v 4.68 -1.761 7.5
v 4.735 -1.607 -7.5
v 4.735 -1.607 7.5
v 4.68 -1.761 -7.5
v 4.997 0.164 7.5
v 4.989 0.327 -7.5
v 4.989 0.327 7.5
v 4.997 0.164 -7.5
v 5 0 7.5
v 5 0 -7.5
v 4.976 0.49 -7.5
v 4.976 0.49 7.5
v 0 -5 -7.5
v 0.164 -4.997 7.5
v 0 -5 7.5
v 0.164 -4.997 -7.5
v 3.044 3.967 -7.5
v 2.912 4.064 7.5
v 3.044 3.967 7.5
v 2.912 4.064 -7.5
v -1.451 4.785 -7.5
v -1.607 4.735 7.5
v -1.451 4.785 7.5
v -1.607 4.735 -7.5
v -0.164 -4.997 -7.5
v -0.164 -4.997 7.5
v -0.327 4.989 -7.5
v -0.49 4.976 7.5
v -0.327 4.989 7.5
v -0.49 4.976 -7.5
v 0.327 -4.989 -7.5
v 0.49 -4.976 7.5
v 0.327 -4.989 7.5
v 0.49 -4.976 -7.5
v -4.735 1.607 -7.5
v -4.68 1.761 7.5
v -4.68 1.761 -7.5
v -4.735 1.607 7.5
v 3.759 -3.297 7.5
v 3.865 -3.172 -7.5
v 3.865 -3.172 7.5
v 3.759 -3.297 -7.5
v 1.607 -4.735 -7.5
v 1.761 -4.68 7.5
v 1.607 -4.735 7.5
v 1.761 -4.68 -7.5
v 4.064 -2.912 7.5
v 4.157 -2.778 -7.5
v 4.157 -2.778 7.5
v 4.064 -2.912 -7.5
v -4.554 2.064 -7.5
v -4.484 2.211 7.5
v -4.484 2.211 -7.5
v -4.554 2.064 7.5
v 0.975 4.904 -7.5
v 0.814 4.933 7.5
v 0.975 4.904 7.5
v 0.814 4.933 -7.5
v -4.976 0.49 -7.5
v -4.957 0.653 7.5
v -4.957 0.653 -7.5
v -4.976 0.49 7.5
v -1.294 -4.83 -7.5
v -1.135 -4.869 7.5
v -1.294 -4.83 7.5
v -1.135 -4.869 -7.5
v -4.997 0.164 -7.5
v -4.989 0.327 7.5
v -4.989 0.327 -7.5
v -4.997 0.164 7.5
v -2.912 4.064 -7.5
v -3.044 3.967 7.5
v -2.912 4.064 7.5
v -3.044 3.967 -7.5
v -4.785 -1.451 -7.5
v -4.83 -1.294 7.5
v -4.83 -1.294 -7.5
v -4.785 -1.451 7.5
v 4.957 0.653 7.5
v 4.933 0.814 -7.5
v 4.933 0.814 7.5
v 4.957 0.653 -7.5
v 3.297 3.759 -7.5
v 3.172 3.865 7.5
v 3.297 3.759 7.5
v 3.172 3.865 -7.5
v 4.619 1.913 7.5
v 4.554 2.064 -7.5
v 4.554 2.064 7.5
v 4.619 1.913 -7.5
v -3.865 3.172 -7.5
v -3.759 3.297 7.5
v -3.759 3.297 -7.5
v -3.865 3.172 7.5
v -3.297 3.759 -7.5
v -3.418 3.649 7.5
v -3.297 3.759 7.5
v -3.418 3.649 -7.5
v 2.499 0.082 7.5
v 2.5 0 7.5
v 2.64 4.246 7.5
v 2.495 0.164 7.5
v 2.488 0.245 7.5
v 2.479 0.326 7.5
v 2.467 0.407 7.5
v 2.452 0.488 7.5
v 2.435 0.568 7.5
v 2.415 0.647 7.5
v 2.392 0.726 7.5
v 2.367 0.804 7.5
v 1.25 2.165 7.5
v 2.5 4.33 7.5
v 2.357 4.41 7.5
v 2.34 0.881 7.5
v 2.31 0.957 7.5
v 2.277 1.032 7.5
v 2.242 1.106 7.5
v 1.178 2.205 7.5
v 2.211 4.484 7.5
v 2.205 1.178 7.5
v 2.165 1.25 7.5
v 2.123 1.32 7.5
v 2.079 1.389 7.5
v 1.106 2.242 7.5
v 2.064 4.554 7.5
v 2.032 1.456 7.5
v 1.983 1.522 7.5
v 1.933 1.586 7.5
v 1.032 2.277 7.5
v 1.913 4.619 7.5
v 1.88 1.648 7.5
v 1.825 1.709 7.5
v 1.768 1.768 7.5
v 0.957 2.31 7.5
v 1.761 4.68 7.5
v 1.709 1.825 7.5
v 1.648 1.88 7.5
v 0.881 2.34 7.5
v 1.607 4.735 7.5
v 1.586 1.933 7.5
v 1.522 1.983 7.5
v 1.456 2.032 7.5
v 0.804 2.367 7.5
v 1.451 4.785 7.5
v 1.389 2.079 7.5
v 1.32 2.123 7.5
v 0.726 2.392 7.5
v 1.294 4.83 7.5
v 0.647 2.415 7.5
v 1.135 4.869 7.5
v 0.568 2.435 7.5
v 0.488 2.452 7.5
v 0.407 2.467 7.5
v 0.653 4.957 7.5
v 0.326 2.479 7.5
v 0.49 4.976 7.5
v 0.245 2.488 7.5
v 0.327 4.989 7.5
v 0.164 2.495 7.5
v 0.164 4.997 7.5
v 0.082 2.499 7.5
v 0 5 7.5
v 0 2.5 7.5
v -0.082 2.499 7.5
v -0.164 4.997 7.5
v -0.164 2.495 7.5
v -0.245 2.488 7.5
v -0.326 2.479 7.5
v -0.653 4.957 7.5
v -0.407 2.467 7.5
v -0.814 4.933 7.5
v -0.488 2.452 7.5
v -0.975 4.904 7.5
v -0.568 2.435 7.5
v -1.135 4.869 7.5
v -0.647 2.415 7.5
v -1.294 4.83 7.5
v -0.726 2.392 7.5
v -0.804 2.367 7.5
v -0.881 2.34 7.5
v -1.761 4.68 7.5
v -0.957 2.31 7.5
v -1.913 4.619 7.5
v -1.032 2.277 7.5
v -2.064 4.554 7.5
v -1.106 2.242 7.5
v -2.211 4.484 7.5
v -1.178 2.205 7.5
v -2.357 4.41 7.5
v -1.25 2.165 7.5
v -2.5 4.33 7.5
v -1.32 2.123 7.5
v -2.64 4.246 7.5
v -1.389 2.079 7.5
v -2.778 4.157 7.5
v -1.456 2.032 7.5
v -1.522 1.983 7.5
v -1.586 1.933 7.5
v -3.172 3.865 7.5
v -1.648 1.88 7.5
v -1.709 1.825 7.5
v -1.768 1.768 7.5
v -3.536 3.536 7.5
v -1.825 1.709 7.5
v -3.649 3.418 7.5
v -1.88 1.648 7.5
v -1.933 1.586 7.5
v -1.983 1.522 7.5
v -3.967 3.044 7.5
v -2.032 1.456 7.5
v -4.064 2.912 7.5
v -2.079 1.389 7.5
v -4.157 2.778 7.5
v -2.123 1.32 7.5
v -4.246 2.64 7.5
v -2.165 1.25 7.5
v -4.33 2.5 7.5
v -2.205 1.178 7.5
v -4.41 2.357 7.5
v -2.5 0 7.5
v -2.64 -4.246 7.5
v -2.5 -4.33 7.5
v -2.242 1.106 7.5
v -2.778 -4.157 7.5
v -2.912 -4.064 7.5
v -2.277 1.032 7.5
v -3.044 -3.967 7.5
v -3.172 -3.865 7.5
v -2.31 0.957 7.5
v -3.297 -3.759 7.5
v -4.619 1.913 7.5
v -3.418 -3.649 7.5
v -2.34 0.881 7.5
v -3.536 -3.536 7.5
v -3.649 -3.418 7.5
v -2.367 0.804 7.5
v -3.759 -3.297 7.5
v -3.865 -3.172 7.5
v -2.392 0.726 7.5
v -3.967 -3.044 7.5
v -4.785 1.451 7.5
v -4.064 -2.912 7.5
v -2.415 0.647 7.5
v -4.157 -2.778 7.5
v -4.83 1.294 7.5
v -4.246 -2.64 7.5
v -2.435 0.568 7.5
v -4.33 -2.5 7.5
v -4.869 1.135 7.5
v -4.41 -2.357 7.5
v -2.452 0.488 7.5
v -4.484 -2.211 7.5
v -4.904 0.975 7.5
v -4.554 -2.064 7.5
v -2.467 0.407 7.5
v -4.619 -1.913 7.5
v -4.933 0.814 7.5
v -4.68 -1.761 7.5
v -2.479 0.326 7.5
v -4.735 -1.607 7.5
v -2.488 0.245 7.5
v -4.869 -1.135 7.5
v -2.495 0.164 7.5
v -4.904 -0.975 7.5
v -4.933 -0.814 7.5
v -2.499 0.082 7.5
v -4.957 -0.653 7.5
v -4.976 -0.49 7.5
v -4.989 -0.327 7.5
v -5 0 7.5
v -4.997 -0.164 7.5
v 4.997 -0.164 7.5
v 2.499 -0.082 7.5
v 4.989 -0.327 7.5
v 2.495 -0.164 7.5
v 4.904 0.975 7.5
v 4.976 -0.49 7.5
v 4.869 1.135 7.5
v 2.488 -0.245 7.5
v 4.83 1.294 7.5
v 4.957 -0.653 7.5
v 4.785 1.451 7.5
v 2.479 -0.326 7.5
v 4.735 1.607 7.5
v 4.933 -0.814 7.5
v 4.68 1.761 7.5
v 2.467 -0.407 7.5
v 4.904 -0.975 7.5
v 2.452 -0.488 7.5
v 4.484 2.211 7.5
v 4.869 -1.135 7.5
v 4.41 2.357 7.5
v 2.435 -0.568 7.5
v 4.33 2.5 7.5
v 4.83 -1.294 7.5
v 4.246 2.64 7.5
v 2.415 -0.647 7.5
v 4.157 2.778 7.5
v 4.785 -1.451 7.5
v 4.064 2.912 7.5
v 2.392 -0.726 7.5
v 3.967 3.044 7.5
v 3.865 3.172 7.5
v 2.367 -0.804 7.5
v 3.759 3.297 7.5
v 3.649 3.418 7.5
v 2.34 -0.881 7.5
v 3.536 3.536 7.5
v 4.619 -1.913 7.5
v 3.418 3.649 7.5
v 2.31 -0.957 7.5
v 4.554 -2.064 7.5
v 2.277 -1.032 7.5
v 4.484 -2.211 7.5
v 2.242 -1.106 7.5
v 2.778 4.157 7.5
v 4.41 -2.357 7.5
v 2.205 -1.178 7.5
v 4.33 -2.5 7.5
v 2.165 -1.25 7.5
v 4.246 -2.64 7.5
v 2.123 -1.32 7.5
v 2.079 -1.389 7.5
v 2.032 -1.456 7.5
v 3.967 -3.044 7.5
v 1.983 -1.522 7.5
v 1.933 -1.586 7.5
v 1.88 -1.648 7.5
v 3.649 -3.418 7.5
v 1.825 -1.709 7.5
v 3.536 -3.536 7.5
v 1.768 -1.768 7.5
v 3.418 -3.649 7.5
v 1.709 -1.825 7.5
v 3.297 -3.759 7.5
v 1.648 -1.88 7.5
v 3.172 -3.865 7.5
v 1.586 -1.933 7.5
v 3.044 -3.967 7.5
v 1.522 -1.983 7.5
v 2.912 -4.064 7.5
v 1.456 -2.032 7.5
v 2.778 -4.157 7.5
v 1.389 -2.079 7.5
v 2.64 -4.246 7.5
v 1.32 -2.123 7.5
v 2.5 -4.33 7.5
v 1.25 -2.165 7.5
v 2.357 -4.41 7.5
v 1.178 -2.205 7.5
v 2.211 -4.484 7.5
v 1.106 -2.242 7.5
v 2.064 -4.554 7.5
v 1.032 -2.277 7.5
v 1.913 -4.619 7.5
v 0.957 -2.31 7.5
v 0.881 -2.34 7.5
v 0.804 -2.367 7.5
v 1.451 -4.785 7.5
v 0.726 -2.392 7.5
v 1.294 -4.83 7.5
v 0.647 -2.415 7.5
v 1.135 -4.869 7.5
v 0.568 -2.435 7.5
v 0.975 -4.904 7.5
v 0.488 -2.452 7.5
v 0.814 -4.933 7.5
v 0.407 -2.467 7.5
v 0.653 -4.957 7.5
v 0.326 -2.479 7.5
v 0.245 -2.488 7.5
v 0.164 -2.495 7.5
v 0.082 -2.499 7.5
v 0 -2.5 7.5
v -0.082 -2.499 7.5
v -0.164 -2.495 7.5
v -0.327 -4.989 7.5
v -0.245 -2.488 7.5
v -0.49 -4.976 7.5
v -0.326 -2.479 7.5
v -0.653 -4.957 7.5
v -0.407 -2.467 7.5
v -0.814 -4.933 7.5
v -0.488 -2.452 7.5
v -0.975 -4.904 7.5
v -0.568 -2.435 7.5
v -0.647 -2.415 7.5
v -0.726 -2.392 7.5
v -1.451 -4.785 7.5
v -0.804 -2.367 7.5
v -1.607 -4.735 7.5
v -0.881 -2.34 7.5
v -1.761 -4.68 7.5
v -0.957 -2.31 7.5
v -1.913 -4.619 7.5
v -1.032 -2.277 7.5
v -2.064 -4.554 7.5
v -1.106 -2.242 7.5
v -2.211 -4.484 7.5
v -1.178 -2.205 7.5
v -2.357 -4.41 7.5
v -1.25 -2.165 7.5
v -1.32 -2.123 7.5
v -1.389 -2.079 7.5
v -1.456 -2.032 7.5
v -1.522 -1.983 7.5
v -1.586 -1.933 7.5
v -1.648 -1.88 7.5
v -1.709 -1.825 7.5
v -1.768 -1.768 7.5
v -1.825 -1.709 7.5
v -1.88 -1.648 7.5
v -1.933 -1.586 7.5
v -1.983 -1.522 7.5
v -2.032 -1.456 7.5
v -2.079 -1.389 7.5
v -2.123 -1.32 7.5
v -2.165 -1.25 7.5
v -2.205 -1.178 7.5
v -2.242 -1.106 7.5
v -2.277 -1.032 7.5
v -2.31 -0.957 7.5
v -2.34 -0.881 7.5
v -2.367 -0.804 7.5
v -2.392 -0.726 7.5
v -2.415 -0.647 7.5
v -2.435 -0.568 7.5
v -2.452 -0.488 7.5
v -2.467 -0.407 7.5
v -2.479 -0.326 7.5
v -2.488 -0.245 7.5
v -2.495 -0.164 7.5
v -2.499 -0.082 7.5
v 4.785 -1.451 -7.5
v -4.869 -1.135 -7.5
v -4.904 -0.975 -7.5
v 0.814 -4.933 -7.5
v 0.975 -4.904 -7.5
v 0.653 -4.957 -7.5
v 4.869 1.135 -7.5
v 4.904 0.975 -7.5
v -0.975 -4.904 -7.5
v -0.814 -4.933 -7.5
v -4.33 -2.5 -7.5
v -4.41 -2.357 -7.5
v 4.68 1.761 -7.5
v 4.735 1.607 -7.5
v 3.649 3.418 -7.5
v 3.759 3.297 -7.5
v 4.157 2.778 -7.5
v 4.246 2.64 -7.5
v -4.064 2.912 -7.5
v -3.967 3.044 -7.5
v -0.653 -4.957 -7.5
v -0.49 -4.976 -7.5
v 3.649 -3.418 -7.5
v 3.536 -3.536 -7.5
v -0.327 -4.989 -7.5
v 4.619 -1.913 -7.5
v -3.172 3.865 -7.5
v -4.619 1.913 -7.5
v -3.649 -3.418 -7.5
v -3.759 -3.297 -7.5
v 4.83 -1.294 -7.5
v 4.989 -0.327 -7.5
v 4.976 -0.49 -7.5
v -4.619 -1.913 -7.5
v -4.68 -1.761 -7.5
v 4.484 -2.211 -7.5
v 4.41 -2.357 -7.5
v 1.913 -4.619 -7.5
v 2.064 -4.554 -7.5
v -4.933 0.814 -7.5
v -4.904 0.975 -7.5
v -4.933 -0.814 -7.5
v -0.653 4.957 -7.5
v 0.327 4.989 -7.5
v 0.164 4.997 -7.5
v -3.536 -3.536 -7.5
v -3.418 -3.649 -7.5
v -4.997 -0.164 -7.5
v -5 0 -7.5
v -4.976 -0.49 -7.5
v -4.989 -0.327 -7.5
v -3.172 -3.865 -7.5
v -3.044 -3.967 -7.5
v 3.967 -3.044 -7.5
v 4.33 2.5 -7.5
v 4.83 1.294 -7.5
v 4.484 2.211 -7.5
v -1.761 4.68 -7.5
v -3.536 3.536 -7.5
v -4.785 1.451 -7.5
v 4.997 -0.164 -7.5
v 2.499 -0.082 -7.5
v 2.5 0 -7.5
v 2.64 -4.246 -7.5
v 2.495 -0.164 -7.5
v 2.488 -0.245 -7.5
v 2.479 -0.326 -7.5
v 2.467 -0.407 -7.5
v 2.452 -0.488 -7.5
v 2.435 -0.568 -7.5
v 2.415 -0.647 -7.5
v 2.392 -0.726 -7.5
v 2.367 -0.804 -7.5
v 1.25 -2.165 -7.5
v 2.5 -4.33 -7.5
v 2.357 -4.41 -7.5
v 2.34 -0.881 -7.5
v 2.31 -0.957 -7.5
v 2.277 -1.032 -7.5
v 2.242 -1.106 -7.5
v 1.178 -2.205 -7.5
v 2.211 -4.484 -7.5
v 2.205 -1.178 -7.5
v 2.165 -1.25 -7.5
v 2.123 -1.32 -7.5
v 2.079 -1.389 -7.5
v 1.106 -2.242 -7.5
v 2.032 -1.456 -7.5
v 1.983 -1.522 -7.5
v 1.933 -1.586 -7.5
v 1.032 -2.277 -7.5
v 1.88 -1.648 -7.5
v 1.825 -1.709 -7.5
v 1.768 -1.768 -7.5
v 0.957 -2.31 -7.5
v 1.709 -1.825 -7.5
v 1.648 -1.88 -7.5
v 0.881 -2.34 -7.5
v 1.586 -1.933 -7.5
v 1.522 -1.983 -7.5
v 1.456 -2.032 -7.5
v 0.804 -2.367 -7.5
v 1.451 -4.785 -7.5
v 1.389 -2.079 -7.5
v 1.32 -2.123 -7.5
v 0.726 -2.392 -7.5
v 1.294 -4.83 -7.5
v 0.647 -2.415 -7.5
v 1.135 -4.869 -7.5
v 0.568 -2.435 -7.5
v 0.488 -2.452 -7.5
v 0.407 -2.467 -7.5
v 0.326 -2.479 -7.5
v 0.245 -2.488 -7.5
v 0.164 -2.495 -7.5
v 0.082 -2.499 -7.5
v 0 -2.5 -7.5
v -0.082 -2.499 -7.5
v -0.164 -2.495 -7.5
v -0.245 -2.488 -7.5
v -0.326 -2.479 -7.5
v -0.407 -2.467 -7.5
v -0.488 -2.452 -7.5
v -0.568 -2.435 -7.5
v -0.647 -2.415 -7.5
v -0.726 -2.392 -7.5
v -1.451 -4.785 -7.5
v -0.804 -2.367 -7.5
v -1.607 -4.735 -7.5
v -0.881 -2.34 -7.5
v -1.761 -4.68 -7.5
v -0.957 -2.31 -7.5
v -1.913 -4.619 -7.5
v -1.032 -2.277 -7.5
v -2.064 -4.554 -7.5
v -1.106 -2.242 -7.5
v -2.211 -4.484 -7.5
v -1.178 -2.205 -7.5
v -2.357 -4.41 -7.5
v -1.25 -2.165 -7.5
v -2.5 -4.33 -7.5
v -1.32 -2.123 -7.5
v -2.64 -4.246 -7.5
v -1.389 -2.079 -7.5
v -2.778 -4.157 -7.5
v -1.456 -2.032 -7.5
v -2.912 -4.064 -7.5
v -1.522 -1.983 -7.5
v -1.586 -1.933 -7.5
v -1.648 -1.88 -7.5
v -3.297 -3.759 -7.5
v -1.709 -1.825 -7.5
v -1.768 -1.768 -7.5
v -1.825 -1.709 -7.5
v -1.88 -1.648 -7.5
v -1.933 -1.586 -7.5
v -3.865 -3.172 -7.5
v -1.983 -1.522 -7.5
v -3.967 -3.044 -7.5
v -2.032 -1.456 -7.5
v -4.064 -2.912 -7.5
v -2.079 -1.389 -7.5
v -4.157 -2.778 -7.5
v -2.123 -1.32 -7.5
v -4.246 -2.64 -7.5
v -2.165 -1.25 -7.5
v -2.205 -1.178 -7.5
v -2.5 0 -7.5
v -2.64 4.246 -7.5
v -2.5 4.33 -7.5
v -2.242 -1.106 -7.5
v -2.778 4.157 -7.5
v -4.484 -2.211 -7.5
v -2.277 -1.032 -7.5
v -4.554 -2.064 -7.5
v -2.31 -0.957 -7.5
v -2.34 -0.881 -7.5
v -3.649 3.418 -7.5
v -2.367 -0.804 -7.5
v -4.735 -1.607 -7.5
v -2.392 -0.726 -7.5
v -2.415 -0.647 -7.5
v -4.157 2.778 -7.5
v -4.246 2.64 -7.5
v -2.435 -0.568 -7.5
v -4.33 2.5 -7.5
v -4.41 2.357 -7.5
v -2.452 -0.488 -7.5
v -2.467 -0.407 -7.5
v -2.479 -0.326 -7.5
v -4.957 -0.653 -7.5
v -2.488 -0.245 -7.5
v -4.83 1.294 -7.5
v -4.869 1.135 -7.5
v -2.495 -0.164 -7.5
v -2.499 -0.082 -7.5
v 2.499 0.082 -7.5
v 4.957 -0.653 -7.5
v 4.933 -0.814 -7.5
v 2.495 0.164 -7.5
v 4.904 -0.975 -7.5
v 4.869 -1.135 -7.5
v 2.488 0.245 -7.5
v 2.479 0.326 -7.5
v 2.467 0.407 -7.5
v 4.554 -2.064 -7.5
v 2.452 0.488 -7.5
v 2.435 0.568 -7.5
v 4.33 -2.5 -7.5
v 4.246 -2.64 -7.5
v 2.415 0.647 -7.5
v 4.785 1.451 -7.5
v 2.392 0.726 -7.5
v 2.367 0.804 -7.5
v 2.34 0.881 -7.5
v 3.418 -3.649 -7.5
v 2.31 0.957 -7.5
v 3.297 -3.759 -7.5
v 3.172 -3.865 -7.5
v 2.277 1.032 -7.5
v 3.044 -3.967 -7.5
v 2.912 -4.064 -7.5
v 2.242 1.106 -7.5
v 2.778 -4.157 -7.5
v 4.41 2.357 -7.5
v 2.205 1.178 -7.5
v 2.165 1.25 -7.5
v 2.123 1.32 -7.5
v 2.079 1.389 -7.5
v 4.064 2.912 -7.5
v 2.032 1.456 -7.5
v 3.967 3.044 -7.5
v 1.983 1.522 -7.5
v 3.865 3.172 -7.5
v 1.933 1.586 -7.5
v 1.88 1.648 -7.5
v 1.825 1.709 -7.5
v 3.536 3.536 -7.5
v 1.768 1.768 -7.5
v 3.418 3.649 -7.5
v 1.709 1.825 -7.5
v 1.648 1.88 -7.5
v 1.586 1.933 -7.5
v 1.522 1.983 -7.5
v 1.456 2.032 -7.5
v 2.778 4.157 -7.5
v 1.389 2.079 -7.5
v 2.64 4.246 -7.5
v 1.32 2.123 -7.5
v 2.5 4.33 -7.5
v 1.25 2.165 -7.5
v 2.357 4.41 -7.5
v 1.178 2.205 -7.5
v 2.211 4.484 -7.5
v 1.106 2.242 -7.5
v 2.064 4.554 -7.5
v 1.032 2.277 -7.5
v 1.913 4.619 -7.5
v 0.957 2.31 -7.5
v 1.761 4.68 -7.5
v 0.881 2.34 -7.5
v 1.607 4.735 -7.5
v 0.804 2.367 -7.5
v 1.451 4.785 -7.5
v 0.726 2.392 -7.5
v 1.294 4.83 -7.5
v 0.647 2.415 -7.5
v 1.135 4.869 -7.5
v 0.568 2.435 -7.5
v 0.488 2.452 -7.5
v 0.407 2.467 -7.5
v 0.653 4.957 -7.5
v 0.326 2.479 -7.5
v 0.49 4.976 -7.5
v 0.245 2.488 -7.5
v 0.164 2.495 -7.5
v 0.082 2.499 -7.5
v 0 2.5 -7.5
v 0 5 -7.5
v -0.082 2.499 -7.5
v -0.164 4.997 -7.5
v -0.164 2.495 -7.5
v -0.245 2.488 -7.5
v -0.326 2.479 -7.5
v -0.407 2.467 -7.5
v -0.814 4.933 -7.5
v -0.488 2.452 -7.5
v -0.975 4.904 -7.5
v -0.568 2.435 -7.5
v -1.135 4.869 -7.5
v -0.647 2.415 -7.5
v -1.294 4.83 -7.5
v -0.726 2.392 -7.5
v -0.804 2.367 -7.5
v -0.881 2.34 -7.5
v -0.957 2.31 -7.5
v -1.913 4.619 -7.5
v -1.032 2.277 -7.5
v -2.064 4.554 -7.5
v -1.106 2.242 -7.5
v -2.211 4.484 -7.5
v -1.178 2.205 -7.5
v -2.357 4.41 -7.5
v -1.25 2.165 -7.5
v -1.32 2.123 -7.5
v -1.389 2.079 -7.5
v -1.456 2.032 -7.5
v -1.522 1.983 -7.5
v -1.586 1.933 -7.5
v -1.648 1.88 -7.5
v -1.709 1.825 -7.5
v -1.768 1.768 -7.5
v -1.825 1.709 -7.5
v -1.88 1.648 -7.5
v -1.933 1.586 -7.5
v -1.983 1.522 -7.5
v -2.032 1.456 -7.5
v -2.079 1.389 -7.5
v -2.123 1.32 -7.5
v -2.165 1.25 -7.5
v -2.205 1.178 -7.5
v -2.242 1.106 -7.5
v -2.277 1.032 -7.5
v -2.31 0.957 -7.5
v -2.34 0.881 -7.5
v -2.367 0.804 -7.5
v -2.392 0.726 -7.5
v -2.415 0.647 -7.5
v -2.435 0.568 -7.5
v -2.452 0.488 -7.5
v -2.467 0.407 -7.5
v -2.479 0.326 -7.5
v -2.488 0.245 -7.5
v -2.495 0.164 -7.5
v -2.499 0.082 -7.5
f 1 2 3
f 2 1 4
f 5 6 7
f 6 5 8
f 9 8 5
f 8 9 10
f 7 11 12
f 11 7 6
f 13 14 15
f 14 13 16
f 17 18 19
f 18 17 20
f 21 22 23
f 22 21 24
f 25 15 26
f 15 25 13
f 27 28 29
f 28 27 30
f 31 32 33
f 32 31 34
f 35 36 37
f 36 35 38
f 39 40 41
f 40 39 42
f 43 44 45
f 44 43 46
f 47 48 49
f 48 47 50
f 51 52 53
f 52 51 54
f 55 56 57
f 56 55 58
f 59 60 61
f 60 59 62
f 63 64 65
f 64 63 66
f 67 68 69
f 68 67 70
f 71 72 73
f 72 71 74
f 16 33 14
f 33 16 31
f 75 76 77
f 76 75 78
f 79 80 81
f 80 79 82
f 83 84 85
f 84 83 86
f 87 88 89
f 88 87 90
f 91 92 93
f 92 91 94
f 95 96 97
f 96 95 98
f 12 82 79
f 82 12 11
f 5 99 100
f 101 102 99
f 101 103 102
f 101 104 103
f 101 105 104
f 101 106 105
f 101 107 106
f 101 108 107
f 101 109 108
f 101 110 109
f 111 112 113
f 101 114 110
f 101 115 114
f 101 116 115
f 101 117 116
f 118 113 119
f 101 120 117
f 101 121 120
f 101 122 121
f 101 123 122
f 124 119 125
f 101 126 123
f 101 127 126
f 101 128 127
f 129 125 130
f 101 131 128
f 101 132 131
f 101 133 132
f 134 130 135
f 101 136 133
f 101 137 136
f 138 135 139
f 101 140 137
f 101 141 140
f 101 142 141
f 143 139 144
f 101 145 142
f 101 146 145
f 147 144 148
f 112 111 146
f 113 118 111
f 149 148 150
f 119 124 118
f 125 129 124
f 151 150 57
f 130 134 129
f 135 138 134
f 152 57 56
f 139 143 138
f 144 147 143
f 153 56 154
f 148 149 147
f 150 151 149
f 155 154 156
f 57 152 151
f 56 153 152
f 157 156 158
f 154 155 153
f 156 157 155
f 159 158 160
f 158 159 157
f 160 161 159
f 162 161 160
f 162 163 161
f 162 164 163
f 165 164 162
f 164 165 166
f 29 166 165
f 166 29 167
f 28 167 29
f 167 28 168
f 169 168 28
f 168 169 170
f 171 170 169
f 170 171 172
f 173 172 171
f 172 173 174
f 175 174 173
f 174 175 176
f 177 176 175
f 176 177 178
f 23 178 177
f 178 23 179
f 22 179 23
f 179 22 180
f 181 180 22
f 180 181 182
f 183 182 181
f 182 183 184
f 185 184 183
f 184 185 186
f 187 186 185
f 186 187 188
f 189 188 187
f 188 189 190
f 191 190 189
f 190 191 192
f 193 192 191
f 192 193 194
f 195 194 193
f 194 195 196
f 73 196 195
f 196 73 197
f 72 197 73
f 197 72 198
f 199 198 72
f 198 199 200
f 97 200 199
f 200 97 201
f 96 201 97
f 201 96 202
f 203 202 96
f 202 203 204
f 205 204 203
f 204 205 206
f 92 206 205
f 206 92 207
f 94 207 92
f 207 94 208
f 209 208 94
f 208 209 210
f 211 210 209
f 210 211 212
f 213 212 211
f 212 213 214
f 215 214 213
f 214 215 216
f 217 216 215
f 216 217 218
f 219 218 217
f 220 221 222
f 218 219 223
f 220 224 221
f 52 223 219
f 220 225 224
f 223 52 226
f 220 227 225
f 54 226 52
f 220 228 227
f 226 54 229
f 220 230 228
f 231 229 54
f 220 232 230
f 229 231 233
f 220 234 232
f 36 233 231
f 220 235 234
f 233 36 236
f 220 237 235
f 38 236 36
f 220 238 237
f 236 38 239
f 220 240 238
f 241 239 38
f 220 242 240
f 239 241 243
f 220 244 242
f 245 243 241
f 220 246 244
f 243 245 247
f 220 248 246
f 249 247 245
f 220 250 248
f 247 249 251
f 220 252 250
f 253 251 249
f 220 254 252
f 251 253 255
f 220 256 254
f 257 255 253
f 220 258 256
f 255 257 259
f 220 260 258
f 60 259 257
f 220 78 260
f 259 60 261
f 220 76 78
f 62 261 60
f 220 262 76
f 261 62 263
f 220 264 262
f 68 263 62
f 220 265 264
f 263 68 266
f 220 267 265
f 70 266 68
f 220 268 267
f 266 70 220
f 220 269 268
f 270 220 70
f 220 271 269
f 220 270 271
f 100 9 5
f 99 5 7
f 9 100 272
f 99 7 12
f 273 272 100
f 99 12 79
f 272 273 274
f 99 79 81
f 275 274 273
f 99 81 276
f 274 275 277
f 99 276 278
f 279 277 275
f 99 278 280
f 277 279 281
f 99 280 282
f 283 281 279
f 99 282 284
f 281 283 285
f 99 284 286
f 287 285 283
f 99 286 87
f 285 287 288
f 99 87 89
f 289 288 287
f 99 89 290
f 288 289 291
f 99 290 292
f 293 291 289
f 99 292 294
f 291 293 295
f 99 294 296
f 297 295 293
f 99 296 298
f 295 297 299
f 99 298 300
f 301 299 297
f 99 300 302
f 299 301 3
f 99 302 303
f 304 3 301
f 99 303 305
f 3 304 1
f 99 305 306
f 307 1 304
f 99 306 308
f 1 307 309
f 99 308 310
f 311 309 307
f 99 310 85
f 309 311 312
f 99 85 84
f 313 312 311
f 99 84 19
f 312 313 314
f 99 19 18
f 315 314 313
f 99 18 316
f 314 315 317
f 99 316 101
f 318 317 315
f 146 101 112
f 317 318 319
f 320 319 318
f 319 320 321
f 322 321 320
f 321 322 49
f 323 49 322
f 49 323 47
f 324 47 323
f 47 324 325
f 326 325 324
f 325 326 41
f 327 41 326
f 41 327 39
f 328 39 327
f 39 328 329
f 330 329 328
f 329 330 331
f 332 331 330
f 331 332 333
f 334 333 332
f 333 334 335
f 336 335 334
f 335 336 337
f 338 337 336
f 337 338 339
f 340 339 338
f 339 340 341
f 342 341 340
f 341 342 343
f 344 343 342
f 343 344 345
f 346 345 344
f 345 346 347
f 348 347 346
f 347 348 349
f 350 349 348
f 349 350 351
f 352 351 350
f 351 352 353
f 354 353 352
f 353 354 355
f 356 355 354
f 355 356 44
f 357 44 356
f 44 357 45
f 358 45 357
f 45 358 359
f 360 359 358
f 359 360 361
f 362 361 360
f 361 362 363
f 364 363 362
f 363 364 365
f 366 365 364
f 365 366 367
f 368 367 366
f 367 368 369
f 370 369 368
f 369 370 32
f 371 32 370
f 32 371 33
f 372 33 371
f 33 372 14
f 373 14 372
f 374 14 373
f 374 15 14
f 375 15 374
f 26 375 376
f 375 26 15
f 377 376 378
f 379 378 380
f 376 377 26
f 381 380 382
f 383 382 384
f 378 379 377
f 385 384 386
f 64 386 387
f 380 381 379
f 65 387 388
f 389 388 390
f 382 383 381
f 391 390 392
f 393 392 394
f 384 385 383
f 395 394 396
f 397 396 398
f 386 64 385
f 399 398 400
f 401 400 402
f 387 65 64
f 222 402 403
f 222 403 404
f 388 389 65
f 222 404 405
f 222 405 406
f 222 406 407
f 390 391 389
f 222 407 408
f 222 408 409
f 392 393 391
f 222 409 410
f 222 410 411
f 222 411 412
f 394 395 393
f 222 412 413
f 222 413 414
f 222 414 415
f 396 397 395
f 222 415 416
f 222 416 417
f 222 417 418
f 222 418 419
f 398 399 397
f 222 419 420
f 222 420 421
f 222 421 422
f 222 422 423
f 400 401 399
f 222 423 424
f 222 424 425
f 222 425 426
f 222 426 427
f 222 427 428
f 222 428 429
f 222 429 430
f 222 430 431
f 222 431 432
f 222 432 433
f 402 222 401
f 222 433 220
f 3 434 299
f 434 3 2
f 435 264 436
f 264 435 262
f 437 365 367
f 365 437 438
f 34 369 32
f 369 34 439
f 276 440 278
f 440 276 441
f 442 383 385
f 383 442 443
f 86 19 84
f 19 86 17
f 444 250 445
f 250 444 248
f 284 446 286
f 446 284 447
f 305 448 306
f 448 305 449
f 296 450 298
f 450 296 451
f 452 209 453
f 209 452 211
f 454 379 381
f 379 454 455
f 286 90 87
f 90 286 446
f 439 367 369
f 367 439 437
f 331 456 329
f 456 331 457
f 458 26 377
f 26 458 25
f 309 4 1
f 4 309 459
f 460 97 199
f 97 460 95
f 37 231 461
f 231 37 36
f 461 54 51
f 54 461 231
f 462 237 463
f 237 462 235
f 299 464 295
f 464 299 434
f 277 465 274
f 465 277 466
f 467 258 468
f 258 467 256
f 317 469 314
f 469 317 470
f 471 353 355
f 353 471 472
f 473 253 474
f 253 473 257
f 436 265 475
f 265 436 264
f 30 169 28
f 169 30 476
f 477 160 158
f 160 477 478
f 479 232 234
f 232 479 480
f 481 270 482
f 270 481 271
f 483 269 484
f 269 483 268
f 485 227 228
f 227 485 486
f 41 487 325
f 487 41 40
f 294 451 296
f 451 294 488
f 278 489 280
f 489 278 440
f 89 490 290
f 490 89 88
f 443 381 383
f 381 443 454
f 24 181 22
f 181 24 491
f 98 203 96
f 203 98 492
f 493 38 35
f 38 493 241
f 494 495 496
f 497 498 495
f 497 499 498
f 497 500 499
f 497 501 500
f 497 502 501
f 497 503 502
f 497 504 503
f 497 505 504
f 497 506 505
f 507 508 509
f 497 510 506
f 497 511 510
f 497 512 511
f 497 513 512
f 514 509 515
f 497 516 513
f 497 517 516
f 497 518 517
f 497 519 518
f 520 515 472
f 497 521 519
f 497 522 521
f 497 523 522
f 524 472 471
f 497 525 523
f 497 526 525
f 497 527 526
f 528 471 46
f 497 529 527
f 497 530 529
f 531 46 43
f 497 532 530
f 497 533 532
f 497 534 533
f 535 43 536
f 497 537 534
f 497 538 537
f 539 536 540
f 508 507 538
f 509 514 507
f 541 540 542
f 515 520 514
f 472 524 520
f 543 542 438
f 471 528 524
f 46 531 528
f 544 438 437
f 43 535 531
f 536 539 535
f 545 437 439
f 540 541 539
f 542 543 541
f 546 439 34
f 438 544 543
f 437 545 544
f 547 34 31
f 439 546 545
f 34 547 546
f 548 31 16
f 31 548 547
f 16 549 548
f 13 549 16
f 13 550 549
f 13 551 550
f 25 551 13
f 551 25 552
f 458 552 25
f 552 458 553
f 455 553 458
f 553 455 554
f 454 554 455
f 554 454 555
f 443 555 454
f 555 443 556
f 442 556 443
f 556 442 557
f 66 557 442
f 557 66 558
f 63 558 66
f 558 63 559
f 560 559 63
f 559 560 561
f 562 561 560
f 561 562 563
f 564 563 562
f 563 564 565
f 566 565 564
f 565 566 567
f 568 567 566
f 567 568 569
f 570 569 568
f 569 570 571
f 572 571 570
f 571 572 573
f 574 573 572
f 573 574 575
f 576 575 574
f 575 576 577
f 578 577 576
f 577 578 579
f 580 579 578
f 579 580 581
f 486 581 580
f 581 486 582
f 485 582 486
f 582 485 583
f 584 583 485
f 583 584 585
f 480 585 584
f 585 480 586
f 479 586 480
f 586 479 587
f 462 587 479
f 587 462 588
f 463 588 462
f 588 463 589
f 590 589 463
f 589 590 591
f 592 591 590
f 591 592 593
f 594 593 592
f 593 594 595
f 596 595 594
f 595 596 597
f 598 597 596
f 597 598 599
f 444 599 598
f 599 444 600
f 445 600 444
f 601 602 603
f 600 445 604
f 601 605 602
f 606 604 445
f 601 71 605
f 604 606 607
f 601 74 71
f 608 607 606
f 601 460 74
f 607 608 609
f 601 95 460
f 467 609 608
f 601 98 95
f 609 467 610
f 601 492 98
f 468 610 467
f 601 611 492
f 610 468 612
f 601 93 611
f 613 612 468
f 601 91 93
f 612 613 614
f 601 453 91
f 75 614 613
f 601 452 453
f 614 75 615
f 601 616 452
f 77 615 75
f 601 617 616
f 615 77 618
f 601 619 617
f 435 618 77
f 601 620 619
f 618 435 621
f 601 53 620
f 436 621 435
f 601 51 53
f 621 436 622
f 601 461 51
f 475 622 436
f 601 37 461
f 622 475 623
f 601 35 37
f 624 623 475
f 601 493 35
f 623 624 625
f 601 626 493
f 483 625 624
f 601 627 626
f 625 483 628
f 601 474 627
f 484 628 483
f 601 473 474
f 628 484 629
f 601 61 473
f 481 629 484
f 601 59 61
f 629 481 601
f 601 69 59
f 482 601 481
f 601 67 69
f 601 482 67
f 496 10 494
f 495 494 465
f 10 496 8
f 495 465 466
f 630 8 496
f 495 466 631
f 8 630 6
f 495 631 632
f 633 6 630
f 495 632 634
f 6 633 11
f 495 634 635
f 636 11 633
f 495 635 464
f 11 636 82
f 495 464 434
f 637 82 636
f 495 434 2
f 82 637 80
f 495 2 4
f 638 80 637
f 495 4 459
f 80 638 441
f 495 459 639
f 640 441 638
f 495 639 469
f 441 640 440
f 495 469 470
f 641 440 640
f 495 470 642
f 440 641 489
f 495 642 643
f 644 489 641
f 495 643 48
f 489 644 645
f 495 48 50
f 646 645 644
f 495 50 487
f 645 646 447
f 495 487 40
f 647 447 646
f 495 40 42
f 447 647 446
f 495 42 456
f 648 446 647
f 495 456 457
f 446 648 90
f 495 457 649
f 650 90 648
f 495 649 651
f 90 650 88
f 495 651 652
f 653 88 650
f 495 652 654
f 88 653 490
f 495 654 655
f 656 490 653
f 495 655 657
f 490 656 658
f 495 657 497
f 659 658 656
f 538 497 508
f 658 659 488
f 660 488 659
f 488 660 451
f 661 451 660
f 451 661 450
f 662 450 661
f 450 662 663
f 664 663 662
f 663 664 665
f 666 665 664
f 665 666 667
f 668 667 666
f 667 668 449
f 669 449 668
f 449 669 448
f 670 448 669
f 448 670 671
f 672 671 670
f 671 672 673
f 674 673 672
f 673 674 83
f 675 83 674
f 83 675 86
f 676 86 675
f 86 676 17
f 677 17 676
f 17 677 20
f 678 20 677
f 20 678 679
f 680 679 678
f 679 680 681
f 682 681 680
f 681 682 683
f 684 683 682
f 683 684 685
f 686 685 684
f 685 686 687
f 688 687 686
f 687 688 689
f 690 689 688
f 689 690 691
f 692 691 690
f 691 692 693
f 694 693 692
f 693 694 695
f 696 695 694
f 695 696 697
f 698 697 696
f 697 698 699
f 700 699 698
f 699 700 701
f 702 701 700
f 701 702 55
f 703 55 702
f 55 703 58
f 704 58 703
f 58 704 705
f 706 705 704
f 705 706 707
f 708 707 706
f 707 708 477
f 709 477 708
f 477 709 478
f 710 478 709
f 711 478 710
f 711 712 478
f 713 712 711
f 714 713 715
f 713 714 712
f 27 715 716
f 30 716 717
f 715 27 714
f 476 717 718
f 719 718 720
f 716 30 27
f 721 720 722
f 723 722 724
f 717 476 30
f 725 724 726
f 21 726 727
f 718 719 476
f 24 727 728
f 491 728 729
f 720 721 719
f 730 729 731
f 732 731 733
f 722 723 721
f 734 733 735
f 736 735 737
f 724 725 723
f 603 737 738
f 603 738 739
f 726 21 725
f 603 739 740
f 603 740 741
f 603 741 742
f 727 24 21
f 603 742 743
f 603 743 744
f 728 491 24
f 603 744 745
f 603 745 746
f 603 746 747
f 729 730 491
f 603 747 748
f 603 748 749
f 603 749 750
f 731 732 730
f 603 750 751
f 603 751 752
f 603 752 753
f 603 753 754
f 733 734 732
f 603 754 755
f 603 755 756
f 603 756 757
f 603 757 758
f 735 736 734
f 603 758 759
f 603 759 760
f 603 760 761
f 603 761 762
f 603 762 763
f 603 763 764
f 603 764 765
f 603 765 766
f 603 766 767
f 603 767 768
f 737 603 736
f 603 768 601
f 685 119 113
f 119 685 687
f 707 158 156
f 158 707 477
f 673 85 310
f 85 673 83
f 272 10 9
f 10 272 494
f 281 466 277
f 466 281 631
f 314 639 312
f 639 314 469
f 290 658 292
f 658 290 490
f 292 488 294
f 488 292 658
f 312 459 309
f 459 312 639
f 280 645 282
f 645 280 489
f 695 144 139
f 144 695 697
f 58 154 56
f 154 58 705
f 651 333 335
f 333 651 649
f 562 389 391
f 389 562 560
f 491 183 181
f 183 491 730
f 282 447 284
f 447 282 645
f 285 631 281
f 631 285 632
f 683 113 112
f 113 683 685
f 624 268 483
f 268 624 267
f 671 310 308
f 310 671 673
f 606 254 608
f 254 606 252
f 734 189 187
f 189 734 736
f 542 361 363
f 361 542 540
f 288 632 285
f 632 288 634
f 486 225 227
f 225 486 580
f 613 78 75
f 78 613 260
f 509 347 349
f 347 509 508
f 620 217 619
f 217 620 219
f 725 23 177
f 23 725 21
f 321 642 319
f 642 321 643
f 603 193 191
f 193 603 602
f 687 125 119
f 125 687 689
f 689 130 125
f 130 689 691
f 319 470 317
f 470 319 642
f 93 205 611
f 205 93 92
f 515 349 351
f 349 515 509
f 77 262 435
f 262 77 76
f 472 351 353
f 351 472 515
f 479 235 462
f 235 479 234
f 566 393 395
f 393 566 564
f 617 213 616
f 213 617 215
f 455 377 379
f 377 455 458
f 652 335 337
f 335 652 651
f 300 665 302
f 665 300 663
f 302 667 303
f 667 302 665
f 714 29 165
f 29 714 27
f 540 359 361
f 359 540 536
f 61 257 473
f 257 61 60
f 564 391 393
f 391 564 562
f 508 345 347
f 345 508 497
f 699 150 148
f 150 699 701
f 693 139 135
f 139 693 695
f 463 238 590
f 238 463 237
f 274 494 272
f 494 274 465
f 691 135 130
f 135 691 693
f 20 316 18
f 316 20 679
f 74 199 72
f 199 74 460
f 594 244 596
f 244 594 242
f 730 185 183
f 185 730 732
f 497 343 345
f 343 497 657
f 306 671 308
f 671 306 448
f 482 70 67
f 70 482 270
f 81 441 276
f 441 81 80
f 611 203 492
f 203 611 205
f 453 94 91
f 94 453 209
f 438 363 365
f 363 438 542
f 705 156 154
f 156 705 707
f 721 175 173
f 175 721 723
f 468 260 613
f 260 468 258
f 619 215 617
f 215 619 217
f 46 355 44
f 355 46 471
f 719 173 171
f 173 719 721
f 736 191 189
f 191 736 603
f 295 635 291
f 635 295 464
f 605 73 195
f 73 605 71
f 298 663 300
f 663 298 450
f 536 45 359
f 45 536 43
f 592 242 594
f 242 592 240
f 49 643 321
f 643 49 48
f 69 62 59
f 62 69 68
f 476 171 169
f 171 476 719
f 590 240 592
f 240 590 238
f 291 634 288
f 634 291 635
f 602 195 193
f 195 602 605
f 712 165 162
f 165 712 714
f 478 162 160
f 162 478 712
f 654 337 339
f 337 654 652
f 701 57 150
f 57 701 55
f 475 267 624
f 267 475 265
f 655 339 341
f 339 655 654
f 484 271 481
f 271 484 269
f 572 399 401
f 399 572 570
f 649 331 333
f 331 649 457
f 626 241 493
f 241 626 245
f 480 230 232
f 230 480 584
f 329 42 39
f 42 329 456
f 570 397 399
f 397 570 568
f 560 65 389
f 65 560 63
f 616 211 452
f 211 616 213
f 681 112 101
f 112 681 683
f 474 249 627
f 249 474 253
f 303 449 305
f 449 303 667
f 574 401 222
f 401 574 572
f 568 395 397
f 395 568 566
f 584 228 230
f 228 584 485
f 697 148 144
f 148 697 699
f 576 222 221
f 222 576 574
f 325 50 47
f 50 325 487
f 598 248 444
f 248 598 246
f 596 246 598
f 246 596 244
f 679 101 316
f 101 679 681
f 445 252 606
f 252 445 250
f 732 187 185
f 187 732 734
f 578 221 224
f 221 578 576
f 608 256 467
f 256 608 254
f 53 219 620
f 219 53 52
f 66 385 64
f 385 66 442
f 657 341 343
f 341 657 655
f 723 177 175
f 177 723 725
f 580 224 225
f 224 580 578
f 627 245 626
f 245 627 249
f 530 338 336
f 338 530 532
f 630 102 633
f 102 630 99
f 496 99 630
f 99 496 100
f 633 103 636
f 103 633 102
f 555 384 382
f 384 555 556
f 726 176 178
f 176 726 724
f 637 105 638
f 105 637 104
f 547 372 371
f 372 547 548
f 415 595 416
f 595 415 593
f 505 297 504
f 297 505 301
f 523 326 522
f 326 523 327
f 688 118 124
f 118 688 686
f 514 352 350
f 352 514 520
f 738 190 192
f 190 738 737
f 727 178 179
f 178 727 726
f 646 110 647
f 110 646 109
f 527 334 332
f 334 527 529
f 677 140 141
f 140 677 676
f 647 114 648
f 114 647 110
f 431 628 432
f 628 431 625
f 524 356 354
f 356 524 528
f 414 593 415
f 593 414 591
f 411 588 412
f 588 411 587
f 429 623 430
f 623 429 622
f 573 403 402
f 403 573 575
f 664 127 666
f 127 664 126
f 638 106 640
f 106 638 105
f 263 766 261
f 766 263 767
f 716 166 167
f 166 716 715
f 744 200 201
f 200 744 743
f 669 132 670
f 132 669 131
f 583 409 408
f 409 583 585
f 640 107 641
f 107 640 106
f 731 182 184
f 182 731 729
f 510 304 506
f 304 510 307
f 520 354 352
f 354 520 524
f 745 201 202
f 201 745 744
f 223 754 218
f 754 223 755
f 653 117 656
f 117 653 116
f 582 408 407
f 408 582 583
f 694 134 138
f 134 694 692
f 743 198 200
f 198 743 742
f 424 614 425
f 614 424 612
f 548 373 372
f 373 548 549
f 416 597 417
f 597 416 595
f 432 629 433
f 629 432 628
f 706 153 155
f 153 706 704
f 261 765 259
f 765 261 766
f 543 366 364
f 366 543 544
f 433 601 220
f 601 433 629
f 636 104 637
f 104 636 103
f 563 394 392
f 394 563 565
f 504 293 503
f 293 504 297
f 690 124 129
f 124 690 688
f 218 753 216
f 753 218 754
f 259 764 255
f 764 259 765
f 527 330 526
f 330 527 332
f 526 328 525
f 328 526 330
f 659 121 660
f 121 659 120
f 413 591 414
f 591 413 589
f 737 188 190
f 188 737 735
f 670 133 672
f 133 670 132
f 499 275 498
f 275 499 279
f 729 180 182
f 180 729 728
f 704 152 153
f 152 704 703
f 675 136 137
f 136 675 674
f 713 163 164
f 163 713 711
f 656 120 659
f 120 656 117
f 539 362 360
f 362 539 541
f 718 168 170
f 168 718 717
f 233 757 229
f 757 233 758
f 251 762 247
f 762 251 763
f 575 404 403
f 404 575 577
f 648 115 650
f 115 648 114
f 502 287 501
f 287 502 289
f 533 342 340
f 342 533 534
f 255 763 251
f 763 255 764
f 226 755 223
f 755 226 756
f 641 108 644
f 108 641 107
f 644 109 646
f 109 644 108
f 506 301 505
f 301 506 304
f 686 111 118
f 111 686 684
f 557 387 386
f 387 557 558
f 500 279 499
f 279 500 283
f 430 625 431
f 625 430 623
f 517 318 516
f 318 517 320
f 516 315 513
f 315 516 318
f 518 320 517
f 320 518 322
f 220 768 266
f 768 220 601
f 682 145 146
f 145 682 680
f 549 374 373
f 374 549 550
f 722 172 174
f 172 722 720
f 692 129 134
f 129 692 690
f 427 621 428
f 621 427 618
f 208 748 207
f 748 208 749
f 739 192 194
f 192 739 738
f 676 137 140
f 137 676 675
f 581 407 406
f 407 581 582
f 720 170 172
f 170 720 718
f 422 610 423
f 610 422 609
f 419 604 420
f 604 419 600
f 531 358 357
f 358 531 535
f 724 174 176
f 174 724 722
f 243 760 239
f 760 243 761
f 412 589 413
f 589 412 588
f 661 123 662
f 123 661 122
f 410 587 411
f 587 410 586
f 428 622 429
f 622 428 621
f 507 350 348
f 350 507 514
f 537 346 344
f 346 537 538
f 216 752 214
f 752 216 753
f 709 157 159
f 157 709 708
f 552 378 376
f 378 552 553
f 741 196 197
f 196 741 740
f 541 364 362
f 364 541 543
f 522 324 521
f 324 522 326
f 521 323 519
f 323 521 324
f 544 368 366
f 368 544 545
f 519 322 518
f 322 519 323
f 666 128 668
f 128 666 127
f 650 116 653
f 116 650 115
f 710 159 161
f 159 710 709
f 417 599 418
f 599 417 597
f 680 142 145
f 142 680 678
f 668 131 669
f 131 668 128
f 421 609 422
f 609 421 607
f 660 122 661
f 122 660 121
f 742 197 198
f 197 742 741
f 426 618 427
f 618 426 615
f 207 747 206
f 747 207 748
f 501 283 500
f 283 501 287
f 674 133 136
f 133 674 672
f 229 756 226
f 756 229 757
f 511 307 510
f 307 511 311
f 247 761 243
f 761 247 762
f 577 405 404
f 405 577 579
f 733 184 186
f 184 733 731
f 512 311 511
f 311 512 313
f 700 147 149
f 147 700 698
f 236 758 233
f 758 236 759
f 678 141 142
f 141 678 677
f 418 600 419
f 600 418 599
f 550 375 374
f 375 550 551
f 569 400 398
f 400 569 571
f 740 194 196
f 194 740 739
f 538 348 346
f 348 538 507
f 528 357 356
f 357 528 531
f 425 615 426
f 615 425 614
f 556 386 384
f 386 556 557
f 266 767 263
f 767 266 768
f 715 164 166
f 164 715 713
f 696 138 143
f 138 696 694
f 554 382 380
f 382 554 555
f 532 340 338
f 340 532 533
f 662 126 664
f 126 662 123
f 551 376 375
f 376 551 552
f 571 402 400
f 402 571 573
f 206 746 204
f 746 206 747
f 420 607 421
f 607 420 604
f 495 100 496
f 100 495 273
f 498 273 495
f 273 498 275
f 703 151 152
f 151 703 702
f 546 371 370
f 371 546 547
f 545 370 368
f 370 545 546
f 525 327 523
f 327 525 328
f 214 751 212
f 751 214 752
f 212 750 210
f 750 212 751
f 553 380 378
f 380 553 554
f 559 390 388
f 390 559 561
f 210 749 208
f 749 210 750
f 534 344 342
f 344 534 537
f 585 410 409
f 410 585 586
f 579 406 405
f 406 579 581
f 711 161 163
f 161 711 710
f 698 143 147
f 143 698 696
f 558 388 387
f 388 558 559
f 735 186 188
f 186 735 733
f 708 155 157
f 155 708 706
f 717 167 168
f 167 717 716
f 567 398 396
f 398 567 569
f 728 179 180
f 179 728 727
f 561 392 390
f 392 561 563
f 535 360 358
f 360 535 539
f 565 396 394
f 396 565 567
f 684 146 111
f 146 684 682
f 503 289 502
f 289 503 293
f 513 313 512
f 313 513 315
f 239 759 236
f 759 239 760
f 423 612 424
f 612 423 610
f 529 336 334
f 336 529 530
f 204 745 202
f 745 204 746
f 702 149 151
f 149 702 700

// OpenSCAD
// Linear bearing: 5.0mm bore (ID), 10.0mm outer diameter (OD), 15.0mm length
// One connected solid with a visible through-bore.

$fn = 192;

// Parameters (mm)
bore_d  = 5.0;
outer_d = 10.0;
length  = 15.0;

// Small overlap to ensure clean boolean operations
overlap = 0.5;

module linear_bearing(id_d, od_d, len) {
    difference() {
        // Outer body (OD x length)
        cylinder(d=od_d, h=len, center=true);

        // Through-bore (ID), extended slightly beyond ends to guarantee cut-through
        cylinder(d=id_d, h=len + 2*overlap, center=true);
    }
}

linear_bearing(bore_d, outer_d, length);
